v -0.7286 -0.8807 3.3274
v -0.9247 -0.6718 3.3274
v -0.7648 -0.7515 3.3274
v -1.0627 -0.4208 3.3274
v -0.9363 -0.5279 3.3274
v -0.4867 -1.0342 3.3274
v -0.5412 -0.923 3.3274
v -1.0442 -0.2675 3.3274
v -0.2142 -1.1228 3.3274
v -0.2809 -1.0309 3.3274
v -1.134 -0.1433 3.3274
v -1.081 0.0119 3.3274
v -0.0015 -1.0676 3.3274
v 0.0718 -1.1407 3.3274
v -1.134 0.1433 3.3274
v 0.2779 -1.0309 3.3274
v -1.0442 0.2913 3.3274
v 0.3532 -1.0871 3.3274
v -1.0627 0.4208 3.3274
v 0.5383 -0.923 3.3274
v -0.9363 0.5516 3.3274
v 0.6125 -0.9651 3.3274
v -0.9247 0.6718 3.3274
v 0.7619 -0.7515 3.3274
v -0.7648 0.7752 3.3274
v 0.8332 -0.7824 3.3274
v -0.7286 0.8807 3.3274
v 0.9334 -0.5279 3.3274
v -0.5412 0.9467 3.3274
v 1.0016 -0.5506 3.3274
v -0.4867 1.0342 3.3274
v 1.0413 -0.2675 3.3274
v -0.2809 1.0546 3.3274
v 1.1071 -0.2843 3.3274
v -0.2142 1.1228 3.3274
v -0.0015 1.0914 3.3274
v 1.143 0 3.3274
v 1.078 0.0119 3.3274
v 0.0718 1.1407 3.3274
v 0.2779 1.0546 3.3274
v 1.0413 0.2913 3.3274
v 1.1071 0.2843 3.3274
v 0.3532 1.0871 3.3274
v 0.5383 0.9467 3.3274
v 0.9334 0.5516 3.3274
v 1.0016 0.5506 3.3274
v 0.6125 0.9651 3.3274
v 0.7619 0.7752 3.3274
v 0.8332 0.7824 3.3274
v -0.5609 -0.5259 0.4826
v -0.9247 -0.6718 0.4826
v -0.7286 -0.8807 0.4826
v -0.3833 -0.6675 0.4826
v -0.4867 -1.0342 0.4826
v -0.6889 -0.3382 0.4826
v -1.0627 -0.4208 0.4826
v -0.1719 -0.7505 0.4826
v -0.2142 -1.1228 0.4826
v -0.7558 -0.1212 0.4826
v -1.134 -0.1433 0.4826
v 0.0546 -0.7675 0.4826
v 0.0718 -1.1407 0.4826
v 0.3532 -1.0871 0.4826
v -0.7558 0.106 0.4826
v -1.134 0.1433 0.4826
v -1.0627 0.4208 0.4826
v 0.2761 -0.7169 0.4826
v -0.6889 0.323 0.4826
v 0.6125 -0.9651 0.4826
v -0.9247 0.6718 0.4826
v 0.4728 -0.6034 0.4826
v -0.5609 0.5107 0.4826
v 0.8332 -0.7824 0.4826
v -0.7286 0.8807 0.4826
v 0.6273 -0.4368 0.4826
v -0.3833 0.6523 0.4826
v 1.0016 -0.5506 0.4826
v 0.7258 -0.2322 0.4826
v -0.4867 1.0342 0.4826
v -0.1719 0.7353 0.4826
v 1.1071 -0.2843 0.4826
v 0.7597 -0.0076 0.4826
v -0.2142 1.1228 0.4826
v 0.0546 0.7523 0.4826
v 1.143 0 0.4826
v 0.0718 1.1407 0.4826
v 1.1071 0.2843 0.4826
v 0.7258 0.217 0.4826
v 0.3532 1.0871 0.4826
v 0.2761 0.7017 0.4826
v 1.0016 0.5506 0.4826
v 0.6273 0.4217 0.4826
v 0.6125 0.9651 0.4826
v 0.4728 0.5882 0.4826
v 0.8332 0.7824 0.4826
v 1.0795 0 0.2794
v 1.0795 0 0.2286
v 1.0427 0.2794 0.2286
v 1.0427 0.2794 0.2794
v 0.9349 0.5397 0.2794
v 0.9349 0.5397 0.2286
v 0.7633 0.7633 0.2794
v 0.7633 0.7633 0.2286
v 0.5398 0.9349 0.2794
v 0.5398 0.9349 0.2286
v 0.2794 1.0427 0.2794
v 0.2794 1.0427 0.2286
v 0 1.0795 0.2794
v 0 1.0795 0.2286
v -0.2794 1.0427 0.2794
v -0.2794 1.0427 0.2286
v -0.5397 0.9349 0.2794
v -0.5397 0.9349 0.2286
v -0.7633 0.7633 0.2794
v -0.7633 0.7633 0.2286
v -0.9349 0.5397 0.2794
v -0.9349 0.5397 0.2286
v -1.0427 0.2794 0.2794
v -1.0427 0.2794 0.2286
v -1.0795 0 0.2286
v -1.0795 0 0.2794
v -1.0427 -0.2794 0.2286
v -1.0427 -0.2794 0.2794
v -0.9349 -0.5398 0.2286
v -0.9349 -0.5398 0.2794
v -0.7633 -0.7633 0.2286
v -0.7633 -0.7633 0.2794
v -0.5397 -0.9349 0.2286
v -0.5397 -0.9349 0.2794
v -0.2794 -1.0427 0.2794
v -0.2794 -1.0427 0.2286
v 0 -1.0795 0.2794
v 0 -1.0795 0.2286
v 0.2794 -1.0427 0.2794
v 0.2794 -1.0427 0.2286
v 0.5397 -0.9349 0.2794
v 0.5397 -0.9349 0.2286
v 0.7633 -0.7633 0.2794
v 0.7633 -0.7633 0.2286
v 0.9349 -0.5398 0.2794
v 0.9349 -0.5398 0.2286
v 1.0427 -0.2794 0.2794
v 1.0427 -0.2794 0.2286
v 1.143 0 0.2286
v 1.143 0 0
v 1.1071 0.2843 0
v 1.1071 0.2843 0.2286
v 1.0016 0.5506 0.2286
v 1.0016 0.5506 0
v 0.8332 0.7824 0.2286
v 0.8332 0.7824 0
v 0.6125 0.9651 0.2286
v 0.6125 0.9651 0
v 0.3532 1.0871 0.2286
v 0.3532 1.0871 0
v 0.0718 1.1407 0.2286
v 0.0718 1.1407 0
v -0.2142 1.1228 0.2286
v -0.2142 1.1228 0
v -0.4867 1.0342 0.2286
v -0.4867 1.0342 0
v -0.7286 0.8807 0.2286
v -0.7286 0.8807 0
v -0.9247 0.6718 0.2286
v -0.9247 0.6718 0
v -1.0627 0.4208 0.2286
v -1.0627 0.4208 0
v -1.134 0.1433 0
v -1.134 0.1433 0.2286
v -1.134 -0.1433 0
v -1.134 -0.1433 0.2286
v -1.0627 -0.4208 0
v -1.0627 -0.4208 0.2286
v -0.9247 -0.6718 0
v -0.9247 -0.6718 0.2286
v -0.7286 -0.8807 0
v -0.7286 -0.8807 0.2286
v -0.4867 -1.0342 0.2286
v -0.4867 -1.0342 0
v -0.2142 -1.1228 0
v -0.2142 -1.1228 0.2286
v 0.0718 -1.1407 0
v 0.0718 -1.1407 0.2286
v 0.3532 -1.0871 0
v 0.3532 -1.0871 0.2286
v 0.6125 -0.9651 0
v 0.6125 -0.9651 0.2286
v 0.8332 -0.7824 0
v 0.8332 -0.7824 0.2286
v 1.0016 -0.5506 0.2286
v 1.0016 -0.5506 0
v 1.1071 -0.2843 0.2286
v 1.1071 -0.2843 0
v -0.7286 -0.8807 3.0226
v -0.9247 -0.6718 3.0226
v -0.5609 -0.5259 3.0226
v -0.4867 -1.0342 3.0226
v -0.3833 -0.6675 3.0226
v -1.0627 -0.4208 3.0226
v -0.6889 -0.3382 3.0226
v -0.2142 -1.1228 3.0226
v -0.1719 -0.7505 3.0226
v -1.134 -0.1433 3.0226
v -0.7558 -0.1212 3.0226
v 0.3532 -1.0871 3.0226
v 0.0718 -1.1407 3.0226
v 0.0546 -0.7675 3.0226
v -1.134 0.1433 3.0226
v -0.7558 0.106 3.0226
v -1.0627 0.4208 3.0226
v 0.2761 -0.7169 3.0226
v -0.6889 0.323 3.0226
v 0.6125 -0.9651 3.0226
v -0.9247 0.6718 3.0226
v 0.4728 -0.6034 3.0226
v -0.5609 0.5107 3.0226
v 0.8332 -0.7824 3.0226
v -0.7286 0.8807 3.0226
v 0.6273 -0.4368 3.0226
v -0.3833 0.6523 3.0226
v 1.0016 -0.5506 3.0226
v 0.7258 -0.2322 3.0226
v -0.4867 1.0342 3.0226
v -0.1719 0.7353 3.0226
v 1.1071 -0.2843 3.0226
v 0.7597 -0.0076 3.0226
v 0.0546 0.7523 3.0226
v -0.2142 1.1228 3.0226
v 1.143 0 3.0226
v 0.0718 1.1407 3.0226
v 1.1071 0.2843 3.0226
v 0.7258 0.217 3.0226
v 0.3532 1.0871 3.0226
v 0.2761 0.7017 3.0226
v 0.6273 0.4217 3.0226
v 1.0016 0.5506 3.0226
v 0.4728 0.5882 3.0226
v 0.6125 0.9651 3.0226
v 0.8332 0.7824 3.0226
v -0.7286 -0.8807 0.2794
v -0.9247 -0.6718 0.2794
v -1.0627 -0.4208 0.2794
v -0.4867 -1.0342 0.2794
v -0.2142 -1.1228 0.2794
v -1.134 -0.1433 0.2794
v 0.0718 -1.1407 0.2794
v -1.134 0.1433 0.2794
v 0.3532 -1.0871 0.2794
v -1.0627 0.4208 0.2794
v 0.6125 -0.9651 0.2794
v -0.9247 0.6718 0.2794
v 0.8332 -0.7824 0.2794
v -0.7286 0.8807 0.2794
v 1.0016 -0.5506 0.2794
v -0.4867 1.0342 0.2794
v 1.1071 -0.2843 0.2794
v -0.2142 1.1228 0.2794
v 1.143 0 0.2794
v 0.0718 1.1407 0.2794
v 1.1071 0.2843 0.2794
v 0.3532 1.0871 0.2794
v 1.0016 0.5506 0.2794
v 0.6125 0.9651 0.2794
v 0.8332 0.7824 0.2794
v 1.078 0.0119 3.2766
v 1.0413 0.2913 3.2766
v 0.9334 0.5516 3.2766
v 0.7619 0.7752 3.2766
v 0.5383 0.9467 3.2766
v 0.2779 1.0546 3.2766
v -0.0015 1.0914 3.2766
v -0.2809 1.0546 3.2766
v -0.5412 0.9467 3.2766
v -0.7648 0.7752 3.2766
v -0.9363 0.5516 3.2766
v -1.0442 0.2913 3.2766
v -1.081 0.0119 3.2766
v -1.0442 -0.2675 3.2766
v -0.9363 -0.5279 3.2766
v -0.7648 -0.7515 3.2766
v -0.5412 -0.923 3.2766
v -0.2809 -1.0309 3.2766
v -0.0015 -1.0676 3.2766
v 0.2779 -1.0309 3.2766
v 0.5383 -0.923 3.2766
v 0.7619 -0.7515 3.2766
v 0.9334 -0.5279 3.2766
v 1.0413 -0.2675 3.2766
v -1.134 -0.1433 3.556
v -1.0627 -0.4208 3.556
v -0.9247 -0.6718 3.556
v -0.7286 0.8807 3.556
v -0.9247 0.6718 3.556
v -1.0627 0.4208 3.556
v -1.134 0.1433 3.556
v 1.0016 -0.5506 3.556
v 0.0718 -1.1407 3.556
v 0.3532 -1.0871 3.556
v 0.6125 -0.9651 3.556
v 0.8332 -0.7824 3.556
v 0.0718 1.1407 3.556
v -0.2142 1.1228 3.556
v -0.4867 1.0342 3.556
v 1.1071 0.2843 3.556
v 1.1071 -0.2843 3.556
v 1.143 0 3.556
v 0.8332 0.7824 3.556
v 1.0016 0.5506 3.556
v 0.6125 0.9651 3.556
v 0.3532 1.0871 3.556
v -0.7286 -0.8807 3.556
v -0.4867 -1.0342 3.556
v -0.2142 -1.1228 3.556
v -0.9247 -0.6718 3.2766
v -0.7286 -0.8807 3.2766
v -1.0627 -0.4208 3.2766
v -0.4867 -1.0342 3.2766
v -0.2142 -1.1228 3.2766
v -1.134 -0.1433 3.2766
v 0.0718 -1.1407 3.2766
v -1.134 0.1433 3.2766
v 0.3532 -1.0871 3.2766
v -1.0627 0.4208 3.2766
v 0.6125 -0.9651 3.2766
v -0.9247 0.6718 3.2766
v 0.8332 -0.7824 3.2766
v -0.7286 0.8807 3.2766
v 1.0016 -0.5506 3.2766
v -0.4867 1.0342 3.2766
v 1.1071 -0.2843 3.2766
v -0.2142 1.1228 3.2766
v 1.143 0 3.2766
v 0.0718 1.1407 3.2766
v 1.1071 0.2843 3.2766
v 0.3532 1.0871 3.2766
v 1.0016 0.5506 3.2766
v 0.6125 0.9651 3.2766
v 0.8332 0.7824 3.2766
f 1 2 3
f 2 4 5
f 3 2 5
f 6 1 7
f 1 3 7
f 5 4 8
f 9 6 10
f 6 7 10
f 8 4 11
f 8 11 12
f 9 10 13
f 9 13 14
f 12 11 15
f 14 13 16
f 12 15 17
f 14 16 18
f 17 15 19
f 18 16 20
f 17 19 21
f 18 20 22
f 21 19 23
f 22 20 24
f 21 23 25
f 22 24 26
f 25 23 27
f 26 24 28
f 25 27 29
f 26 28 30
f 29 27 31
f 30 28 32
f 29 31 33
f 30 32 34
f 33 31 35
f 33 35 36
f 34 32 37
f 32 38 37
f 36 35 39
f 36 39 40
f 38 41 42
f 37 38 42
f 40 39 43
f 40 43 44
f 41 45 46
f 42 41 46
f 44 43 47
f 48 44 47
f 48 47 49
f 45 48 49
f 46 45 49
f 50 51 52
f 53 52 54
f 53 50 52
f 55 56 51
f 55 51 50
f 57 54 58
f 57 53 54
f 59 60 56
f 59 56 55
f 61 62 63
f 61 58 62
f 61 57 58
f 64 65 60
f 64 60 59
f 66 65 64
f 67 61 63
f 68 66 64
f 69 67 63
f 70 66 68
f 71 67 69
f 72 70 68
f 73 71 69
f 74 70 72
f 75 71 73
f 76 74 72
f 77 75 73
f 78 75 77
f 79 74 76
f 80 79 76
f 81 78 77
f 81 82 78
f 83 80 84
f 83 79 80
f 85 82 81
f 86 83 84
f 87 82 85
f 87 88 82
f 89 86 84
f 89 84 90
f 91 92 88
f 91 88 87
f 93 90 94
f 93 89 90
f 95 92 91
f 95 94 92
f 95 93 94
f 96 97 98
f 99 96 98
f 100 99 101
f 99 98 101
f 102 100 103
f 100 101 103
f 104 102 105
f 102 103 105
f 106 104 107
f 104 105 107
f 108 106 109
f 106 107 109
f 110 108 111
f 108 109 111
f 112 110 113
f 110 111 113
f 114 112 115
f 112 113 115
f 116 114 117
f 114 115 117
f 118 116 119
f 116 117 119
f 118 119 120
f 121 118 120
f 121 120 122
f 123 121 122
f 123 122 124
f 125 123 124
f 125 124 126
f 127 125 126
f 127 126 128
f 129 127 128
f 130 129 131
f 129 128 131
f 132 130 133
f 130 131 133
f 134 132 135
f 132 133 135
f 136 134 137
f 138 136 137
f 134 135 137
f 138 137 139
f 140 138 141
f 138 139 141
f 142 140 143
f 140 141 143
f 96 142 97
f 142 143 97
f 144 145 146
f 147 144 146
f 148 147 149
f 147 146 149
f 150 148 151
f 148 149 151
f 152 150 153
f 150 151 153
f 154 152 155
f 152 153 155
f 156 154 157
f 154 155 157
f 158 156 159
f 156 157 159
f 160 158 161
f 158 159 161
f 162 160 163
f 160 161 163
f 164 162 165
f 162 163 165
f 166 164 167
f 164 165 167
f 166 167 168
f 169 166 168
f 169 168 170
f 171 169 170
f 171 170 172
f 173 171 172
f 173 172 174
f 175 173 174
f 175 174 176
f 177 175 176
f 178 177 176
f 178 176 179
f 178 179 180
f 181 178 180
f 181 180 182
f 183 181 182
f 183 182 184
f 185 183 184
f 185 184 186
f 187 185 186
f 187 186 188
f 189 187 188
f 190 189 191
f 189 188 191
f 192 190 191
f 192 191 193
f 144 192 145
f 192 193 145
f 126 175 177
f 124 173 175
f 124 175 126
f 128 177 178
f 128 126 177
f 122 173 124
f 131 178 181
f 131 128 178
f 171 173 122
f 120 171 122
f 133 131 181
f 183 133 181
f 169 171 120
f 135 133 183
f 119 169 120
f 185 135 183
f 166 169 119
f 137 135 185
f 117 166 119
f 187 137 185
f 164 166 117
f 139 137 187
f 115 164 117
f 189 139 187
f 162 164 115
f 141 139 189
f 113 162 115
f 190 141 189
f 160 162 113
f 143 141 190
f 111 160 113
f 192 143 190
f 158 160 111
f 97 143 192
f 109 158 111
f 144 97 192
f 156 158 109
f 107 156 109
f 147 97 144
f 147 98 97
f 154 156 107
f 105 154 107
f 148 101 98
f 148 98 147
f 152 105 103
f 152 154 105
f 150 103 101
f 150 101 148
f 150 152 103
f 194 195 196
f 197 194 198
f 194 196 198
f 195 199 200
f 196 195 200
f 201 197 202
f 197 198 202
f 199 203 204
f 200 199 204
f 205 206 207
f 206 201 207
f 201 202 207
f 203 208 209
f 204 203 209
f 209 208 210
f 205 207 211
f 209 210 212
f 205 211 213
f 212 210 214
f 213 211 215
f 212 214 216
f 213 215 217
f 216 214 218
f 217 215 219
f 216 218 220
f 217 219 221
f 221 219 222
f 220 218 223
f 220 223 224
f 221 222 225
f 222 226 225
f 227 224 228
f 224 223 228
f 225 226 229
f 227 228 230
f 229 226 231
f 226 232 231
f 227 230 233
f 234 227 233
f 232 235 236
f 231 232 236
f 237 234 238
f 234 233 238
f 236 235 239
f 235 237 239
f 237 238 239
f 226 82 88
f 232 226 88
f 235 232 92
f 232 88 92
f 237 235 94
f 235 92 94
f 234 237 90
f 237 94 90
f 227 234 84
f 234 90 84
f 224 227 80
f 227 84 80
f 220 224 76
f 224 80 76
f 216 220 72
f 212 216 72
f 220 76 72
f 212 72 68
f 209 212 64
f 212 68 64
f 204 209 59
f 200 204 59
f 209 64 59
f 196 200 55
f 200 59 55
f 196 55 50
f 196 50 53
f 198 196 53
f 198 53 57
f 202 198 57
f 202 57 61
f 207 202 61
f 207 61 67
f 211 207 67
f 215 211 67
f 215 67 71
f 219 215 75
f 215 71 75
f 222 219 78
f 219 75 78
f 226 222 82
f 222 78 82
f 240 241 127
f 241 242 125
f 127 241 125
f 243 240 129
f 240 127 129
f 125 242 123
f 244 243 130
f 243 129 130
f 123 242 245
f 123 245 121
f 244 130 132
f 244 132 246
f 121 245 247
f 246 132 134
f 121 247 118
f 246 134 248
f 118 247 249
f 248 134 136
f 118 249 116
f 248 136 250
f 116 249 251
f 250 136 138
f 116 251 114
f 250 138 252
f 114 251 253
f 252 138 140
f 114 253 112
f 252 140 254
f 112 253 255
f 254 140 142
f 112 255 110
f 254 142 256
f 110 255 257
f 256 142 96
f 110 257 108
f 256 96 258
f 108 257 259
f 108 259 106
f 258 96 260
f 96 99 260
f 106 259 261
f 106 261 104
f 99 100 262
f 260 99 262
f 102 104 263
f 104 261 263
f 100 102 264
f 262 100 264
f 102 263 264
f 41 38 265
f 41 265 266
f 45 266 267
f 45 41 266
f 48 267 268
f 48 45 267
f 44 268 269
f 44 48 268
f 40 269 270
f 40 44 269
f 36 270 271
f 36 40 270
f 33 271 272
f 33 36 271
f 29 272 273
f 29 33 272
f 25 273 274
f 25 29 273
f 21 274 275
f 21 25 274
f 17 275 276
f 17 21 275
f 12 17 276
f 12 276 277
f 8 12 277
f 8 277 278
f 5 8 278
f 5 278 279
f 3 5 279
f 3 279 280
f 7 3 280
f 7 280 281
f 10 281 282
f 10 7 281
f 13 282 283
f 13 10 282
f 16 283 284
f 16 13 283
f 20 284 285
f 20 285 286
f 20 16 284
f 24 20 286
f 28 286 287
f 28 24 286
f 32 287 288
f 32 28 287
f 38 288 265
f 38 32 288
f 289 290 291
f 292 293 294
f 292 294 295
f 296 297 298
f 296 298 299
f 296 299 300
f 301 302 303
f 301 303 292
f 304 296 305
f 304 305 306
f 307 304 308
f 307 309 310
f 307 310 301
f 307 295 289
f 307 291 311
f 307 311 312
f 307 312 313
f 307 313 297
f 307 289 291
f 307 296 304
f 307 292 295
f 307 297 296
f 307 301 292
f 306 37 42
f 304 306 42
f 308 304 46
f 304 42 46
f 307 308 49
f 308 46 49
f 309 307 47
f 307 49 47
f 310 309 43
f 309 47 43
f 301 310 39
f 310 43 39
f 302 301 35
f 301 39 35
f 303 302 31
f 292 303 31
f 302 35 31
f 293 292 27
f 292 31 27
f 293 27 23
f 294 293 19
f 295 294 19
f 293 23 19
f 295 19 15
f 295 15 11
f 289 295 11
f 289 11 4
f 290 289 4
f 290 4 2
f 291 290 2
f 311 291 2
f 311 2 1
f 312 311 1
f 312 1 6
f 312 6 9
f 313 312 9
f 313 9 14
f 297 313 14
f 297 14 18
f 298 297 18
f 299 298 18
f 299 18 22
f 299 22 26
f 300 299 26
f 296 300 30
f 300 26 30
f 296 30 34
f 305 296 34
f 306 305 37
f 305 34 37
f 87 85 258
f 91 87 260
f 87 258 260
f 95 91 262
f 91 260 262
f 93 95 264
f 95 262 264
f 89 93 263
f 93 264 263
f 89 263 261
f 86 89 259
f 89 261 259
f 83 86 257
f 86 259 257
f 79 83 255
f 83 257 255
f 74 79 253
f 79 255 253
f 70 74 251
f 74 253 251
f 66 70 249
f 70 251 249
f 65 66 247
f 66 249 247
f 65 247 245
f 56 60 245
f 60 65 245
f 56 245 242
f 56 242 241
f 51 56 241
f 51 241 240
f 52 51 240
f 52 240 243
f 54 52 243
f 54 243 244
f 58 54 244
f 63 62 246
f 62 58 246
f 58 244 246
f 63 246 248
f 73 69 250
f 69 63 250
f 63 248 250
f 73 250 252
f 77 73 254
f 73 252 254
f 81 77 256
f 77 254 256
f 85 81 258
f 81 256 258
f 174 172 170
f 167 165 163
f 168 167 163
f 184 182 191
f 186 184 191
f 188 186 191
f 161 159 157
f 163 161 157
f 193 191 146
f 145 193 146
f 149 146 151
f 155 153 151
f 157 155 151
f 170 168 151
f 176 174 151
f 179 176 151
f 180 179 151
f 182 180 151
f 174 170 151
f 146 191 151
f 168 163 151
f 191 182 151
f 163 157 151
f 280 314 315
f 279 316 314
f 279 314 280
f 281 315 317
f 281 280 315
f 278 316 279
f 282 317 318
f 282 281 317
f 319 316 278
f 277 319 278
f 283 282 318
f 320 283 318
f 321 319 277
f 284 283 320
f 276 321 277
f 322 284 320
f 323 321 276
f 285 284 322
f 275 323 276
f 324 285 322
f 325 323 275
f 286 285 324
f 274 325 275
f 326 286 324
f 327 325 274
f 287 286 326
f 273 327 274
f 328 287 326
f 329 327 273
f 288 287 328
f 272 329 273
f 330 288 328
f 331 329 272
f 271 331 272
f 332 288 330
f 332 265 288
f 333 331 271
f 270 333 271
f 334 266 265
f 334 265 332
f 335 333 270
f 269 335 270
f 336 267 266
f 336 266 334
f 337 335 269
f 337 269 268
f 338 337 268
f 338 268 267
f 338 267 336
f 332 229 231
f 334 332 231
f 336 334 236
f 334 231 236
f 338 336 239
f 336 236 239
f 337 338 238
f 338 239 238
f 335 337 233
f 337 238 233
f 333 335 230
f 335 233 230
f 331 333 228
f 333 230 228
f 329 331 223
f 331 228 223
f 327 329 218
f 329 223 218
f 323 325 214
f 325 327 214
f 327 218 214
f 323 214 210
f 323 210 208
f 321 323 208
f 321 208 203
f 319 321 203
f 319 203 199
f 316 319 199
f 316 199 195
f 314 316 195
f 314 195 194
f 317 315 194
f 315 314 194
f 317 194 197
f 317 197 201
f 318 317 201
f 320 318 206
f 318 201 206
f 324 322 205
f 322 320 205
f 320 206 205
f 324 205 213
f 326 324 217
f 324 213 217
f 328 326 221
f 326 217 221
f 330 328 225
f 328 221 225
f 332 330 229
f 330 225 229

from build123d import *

# Parameters (mm, degrees)
F0_R      = 1.143
F1_DEPTH  = 3.556
F4_R      = 1.143
F4_R_2    = 1.0795
F5_DEPTH  = 0.0508
F6_R      = 1.1557
F6_R_2    = 1.0795
F7_DEPTH  = 0.0508
F9_R      = 1.1557
F9_R_2    = 0.762
F10_DEPTH = 2.54


with BuildPart() as f1:
    # F0 (on Top) → F1 (new body)
    with BuildSketch(Plane.XY):
        Circle(F0_R)
    extrude(amount=F1_DEPTH)

    # F4 (on offset) → F5 (cut)
    with BuildSketch(Plane.XY.offset(0.2286)):
        Circle(F4_R)
        Circle(F4_R_2, mode=Mode.SUBTRACT)
    extrude(amount=F5_DEPTH, mode=Mode.SUBTRACT)

    # F6 (on offset) → F7 (cut)
    with BuildSketch(Plane.XY.offset(3.3274)):
        with Locations((-0.00146219, 0.0118558792)):
            Circle(F6_R)
        with Locations((-0.00146219, 0.0118558792)):
            Circle(F6_R_2, mode=Mode.SUBTRACT)
    extrude(amount=-F7_DEPTH, mode=Mode.SUBTRACT)

    # F9 (on offset) → F10 (cut)
    with BuildSketch(Plane.XY.offset(0.4826)):
        with Locations((-0.002316847, -0.0075962889)):
            Circle(F9_R)
        with Locations((-0.002316847, -0.0075962889)):
            Circle(F9_R_2, mode=Mode.SUBTRACT)
    extrude(amount=F10_DEPTH, mode=Mode.SUBTRACT)


solid = f1.part
